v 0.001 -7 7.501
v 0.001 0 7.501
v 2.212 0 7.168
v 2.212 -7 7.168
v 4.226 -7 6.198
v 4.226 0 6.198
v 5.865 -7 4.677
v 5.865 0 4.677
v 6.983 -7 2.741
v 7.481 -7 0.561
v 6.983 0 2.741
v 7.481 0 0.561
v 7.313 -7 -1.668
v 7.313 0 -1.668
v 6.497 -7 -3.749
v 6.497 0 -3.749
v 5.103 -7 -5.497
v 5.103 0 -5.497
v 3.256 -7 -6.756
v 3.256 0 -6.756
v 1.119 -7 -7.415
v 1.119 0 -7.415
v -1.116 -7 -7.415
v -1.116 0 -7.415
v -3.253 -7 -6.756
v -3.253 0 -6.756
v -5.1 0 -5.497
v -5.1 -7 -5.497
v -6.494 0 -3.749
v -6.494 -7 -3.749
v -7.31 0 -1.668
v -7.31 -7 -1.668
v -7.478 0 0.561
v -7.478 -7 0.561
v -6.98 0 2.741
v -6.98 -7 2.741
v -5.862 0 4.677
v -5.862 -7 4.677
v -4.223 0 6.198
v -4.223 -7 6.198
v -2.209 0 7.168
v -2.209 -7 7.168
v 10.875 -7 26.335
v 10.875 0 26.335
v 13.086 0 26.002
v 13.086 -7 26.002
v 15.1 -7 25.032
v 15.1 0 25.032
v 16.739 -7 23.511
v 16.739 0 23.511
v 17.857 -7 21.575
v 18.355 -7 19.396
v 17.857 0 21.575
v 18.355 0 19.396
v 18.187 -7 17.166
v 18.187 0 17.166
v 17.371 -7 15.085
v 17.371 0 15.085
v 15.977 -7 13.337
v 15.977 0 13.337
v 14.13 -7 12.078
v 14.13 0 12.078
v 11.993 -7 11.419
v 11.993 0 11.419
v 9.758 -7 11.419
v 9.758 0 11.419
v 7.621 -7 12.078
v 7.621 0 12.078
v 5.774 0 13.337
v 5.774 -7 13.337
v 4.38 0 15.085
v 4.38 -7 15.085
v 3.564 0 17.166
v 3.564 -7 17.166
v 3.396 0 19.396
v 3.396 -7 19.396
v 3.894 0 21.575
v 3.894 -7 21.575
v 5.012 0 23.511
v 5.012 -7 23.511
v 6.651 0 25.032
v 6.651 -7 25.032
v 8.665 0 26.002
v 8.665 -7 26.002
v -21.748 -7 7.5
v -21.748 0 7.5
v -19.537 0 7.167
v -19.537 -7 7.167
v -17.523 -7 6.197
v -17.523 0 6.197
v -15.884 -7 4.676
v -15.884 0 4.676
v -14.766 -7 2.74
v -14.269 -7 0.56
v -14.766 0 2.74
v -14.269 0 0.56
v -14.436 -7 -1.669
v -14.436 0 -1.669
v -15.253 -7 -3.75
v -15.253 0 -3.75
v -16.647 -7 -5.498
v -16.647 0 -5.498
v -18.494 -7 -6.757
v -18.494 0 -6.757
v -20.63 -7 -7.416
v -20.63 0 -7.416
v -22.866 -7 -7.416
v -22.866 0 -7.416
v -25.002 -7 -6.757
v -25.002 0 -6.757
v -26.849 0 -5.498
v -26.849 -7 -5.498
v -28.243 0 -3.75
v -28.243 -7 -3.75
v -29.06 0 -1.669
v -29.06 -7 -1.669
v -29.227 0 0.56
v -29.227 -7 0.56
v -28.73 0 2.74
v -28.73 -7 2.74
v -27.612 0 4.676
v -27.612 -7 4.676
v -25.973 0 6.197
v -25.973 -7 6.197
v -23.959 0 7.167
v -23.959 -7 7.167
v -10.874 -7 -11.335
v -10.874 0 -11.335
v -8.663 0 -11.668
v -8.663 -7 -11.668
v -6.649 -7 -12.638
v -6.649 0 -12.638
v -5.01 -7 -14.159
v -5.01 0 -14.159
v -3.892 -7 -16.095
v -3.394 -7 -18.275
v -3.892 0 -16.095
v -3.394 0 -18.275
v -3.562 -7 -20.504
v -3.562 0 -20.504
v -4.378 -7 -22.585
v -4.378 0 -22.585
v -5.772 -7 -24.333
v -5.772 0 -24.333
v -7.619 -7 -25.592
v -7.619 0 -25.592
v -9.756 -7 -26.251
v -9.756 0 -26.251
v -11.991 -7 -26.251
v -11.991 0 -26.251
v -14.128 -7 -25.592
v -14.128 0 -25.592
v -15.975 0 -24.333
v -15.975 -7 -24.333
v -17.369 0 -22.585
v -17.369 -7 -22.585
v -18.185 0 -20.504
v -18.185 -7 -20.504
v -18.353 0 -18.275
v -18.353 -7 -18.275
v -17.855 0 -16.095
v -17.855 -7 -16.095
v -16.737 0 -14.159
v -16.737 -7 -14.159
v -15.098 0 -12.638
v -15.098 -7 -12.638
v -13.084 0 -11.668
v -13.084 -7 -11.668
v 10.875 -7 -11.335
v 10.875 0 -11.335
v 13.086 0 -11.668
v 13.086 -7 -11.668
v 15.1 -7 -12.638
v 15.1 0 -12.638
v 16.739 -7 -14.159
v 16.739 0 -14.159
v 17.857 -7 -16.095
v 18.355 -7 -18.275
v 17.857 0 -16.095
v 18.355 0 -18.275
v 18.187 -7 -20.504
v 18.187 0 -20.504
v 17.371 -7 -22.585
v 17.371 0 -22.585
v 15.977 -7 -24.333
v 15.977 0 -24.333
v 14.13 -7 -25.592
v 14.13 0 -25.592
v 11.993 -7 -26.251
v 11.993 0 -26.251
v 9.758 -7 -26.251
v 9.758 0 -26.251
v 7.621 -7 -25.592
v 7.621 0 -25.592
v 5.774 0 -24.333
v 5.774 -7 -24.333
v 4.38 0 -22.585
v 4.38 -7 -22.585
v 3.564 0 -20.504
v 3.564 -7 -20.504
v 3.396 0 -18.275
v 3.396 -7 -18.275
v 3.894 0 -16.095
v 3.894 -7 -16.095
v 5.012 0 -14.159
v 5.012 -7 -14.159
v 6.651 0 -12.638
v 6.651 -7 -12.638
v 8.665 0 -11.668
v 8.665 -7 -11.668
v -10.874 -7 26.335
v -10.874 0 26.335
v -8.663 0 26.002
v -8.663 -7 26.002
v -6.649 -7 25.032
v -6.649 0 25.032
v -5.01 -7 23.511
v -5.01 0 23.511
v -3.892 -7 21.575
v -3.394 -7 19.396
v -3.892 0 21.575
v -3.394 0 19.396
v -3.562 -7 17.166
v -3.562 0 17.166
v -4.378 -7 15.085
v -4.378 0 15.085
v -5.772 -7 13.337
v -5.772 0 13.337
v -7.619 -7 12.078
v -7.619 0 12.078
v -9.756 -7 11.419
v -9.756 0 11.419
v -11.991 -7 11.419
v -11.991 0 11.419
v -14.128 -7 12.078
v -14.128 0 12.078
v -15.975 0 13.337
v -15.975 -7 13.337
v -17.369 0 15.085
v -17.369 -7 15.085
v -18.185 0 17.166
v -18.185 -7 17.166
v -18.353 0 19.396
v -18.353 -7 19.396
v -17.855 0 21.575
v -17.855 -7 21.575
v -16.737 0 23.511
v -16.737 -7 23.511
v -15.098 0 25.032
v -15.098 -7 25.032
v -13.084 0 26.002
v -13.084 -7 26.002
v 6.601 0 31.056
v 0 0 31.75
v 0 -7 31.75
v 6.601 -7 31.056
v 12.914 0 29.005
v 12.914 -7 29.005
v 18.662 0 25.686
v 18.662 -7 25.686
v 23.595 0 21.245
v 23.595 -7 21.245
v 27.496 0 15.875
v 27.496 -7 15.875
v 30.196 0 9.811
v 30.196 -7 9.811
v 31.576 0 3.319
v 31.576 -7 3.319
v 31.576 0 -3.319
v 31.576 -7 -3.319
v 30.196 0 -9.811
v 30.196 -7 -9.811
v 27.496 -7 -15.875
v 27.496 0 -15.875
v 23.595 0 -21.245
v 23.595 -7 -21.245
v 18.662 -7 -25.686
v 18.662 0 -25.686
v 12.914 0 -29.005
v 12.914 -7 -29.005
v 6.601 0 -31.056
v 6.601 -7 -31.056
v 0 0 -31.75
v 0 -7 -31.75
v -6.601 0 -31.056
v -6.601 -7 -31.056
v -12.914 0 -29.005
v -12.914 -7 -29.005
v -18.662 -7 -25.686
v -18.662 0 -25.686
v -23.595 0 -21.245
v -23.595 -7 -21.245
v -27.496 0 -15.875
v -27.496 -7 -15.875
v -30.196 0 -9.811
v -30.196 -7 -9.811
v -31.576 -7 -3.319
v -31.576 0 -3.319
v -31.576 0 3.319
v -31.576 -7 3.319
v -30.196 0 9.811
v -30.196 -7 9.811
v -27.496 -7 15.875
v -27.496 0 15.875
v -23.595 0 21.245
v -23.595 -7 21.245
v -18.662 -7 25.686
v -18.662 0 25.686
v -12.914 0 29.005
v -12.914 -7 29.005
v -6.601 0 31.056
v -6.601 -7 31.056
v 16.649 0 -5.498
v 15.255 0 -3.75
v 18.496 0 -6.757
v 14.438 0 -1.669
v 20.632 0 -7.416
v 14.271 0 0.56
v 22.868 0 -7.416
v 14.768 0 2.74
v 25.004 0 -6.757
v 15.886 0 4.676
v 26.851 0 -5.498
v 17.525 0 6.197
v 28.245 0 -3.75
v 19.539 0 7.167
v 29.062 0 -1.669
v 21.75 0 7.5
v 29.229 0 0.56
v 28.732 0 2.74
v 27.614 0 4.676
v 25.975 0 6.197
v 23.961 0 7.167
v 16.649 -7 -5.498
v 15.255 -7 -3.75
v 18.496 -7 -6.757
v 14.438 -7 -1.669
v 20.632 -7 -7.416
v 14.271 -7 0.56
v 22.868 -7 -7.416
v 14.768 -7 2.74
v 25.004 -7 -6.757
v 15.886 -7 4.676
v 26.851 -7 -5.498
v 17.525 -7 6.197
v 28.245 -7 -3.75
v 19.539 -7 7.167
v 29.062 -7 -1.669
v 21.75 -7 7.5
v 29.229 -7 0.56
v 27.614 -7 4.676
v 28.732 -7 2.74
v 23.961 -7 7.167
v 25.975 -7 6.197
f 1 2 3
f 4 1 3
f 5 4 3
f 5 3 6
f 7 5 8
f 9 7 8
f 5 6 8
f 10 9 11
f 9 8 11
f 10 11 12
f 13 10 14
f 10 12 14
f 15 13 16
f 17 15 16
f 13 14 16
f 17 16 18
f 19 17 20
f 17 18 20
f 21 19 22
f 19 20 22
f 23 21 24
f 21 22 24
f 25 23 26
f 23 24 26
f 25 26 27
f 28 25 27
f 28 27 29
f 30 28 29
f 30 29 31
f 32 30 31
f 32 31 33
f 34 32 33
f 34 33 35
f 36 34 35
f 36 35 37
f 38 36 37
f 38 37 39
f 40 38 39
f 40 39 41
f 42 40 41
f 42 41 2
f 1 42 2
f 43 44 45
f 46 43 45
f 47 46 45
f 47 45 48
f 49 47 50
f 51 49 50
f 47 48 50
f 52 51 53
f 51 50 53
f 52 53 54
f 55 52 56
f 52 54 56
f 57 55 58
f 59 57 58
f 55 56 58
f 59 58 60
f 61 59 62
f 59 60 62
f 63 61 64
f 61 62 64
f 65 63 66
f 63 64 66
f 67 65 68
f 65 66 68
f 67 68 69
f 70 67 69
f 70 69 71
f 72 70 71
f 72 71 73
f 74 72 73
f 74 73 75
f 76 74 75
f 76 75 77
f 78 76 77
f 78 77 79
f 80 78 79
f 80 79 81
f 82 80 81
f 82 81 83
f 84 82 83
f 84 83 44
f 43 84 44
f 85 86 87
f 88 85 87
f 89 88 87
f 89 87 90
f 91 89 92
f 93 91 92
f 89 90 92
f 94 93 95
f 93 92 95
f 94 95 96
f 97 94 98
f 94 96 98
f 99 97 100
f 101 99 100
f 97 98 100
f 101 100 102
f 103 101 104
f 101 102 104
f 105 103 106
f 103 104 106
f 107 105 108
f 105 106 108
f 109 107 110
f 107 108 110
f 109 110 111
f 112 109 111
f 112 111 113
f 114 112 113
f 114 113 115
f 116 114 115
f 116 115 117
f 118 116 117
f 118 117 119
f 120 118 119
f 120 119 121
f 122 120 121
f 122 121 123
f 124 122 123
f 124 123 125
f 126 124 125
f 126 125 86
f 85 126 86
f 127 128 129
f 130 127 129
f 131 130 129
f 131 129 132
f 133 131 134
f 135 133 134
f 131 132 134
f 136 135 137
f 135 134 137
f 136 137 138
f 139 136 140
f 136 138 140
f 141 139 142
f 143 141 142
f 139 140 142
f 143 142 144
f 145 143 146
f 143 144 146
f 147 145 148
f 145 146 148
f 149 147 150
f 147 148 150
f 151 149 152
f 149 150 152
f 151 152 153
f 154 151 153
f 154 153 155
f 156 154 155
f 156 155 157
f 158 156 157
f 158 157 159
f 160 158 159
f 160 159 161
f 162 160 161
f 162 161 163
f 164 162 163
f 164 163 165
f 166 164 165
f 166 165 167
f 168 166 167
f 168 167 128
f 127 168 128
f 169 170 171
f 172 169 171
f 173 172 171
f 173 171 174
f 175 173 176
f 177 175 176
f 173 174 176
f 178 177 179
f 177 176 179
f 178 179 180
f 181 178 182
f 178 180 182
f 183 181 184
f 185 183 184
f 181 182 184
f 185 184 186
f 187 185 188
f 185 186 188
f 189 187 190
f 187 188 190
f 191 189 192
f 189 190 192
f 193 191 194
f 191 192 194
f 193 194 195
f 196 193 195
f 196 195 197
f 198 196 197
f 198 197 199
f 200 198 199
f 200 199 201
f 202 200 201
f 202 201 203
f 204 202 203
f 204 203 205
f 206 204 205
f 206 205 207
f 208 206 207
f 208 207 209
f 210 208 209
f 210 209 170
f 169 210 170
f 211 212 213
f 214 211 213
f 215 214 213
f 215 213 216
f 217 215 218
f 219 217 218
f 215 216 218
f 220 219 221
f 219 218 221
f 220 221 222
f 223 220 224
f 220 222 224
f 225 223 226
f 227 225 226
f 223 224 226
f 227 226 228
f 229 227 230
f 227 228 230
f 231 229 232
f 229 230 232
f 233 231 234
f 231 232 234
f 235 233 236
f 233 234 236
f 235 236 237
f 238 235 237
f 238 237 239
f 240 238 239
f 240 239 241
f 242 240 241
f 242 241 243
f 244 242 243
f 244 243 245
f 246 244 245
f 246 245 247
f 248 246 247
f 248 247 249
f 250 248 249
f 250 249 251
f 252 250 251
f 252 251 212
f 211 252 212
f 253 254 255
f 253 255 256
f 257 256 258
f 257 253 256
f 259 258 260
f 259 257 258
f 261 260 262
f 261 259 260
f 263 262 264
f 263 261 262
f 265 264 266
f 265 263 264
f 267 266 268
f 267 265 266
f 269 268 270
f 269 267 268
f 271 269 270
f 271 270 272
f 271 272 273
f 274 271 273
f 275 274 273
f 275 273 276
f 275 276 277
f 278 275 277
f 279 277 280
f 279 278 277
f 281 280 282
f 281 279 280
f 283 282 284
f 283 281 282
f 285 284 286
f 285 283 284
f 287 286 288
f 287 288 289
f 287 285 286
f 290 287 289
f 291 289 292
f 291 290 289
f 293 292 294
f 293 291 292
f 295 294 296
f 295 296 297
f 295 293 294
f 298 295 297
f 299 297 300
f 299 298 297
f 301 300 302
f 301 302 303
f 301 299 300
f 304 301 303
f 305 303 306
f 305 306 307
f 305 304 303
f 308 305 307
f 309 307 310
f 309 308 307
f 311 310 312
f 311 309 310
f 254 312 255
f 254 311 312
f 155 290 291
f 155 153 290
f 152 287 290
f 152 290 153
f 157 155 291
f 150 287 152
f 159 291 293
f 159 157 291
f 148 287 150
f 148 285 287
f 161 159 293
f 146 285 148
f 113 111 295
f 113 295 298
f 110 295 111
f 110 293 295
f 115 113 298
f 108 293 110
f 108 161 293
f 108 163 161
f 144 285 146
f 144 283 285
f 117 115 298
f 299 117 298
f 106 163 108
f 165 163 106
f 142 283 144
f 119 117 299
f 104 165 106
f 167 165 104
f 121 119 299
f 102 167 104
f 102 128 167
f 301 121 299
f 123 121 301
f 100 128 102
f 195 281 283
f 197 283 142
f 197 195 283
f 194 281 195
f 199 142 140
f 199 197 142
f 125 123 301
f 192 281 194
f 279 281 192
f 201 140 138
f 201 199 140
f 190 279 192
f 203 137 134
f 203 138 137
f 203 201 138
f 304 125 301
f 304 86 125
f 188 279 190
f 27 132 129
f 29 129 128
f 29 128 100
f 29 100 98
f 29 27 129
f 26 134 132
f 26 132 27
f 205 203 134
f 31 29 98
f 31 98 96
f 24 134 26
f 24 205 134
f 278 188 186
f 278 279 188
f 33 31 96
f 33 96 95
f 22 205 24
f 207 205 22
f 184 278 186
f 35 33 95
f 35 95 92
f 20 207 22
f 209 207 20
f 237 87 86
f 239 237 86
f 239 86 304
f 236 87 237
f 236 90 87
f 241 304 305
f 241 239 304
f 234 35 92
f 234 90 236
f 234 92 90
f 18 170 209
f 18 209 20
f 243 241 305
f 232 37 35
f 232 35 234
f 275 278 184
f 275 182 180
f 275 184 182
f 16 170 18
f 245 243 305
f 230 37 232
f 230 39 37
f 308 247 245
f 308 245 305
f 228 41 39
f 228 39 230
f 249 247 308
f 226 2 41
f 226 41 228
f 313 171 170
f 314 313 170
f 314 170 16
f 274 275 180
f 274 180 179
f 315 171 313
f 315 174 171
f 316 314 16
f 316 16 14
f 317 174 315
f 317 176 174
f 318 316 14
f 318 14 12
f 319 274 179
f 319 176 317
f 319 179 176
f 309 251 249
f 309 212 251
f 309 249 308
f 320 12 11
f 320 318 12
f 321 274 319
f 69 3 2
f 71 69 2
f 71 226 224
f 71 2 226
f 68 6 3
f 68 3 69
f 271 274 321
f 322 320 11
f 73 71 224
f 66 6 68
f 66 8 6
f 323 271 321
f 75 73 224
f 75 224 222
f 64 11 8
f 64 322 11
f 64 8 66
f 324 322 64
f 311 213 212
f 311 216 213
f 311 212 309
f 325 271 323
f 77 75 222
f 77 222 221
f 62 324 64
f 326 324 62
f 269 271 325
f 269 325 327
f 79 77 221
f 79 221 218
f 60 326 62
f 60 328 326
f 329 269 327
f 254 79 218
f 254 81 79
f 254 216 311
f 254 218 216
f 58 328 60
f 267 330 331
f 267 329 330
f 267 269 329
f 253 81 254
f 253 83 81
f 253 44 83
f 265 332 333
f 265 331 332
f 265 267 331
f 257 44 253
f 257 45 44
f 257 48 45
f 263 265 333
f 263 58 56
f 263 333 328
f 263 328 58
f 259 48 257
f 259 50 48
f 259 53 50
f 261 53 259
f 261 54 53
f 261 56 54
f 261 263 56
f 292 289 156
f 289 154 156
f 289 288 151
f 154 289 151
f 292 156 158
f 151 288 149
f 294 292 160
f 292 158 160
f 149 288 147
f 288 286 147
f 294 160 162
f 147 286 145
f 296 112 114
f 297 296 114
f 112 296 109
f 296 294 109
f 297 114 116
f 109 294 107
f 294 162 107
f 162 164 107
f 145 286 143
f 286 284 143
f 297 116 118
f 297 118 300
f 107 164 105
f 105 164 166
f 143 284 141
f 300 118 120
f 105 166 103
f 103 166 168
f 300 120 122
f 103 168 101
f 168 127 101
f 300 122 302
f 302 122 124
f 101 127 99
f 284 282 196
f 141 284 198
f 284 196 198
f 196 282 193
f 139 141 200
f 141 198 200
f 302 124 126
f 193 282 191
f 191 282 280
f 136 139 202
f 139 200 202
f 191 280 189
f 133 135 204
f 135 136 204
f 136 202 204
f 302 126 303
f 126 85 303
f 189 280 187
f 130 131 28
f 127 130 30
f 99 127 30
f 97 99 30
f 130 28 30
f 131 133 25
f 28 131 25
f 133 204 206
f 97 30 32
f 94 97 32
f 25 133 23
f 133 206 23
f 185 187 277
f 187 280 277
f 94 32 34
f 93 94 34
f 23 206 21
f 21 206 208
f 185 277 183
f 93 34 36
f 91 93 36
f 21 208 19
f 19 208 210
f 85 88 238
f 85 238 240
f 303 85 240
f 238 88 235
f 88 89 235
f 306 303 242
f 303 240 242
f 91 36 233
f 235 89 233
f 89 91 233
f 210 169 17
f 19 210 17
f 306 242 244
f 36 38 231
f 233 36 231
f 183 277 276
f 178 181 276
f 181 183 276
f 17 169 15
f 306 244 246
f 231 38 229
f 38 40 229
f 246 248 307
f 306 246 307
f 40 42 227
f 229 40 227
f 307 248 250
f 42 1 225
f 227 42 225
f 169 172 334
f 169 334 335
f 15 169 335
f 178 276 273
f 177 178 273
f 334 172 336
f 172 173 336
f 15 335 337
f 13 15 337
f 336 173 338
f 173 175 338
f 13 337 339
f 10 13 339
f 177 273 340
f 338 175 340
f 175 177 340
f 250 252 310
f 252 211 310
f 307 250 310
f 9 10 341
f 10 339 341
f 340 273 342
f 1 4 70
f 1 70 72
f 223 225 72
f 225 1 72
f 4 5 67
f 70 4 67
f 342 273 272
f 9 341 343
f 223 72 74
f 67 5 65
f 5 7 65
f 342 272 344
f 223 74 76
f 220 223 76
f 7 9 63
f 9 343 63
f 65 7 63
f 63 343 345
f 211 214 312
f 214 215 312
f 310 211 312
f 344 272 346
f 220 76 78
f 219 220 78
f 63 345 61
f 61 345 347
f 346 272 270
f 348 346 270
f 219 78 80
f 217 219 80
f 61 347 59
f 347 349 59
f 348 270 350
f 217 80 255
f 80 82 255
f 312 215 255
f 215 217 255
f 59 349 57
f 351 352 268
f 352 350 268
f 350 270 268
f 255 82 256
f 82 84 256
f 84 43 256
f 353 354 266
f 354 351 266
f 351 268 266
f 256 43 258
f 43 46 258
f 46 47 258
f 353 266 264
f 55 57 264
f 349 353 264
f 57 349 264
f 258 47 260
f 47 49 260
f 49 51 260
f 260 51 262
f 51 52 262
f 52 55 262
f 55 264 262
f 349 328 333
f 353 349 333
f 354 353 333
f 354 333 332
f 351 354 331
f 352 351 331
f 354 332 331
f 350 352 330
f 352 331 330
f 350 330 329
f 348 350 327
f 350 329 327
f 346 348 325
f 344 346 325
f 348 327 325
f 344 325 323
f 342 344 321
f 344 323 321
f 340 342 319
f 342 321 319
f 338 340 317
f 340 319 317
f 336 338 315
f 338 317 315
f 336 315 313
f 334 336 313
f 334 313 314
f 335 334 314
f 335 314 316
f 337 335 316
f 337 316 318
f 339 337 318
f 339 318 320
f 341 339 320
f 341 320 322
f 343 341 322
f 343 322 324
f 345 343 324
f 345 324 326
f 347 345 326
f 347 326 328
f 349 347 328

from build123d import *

# Parameters (mm, degrees)
ESBO_O1_R                = 31.75
RESSALTO_EXTRUS_O1_DEPTH = 7
ESBO_O2_R                = 7.5
CORTE_EXTRUS_O1_DEPTH    = 10


with BuildPart() as part:
    # Esboço1 → Ressalto-extrusão1 (new body)
    with BuildSketch(Plane(origin=(0, 0, 0), x_dir=(1, 0, 0), z_dir=(0, 1, 0))):
        with Locations(Location((0, 0, 0), (0, 0, 270))):
            Circle(ESBO_O1_R)
    extrude(amount=-RESSALTO_EXTRUS_O1_DEPTH)

    # Esboço2 → Corte-extrusão1 (cut)
    with BuildSketch(Plane(origin=(0, 0, 0), x_dir=(1, 0, 0), z_dir=(0, 1, 0))):
        with Locations(Location((21.75, 0, 0), (0, 0, 270))):
            Circle(ESBO_O2_R)
        with Locations(Location((10.8755, -18.835186507, 0), (0, 0, 270))):
            Circle(ESBO_O2_R)
        with Locations(Location((-10.8735, -18.835186507, 0), (0, 0, 270))):
            Circle(ESBO_O2_R)
        with Locations(Location((-21.748, 0, 0), (0, 0, 270))):
            Circle(ESBO_O2_R)
        with Locations(Location((0.0015, -0.000866025, 0), (0, 0, 270))):
            Circle(ESBO_O2_R)
        with Locations(Location((-10.8735, 18.835186507, 0), (0, 0, 270))):
            Circle(ESBO_O2_R)
        with Locations(Location((10.8755, 18.835186507, 0), (0, 0, 270))):
            Circle(ESBO_O2_R)
    extrude(amount=-CORTE_EXTRUS_O1_DEPTH, mode=Mode.SUBTRACT)


solid = part.part
